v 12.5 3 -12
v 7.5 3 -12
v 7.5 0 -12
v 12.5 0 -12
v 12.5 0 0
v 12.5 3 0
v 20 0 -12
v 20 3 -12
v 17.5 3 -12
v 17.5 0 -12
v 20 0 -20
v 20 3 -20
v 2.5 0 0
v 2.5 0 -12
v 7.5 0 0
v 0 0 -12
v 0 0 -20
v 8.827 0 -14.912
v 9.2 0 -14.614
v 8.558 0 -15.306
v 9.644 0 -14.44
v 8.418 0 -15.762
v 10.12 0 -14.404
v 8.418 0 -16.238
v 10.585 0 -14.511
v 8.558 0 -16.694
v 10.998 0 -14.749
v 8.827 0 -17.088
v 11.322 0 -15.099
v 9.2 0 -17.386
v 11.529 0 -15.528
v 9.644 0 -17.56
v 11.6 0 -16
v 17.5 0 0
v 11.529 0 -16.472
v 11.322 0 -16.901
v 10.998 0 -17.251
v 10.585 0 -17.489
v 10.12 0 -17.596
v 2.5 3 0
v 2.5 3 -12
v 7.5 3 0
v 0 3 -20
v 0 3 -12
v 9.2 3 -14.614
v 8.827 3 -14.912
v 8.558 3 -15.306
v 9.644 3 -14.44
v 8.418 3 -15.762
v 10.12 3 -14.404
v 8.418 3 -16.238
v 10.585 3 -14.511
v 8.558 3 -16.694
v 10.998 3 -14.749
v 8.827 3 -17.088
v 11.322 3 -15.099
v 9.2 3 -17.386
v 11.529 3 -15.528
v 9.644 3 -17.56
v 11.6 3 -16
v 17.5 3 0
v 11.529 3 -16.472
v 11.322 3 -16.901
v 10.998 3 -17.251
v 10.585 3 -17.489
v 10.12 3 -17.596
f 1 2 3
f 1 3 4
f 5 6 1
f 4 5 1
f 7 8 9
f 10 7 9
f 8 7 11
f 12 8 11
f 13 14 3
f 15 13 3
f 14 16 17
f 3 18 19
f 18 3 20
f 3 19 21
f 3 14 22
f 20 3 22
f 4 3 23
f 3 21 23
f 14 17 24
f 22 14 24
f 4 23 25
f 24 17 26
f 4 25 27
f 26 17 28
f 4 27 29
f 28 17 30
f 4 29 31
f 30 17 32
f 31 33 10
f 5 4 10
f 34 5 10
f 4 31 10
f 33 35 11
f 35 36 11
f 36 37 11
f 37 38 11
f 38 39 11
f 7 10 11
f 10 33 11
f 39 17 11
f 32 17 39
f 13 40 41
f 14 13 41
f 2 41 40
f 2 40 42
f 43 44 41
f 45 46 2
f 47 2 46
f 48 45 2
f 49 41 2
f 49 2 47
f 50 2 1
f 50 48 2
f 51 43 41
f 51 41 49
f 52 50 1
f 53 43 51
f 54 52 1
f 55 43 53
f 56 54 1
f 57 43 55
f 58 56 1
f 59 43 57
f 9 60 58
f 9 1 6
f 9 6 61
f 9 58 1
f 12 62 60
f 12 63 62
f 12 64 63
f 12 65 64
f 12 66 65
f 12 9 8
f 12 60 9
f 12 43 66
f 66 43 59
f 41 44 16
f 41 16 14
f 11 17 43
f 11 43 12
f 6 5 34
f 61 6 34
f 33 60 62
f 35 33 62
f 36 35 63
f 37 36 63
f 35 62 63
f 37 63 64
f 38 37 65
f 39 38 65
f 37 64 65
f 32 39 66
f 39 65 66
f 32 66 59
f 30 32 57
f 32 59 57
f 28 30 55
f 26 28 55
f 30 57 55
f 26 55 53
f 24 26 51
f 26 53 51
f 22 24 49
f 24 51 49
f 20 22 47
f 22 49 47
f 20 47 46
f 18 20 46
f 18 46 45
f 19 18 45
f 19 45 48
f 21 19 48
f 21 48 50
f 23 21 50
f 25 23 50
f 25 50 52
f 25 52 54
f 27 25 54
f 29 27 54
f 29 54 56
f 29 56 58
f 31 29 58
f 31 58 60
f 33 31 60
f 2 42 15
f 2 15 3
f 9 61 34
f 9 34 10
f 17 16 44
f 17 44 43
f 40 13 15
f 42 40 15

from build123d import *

# Parameters (mm, degrees)
SKETCH1_W               = 20
SKETCH1_H               = 20
BOSS_EXTRUDE1_DEPTH     = 3
SKETCH2_W               = 2.5
SKETCH2_H               = 12
CUT_EXTRUDE1_DEPTH      = 3
SKETCH3_R               = 1.6
CUT_EXTRUDE2_DEPTH      = 1
CUT_EXTRUDE2_DEPTH_BACK = 4
SKETCH4_W               = 5
SKETCH4_H               = 12
CUT_EXTRUDE3_DEPTH      = 1
CUT_EXTRUDE3_DEPTH_BACK = 4


with BuildPart() as part:
    # Sketch1 → Boss-Extrude1 (new body)
    with BuildSketch(Plane(origin=(0, 0, 0), x_dir=(1, 0, 0), z_dir=(0, 1, 0))):
        with Locations((10, 10)):
            Rectangle(SKETCH1_W, SKETCH1_H)
    extrude(amount=BOSS_EXTRUDE1_DEPTH)

    # Sketch2 → Cut-Extrude1 (cut)
    with BuildSketch(Plane(origin=(0, 3, 0), x_dir=(1, 0, 0), z_dir=(0, 1, 0))):
        with Locations((1.25, 6)):
            Rectangle(SKETCH2_W, SKETCH2_H)
    cut_extrude1 = extrude(amount=-CUT_EXTRUDE1_DEPTH, mode=Mode.SUBTRACT)

    # Mirror1: Cut-Extrude1 across plane
    add(cut_extrude1.mirror(Plane.ZY.offset(-10)), mode=Mode.SUBTRACT)

    # Sketch3 → Cut-Extrude2 (cut, two sides)
    with BuildSketch(Plane(origin=(0, 3, 0), x_dir=(1, 0, 0), z_dir=(0, 1, 0))) as cut_extrude2_sk:
        with Locations((10, 16)):
            Circle(SKETCH3_R)
    extrude(amount=CUT_EXTRUDE2_DEPTH, mode=Mode.SUBTRACT)
    extrude(cut_extrude2_sk.sketch, amount=-CUT_EXTRUDE2_DEPTH_BACK, mode=Mode.SUBTRACT)

    # Sketch4 → Cut-Extrude3 (cut, two sides)
    with BuildSketch(Plane(origin=(0, 3, 0), x_dir=(1, 0, 0), z_dir=(0, 1, 0))) as cut_extrude3_sk:
        with Locations((10, 6)):
            Rectangle(SKETCH4_W, SKETCH4_H)
    extrude(amount=CUT_EXTRUDE3_DEPTH, mode=Mode.SUBTRACT)
    extrude(cut_extrude3_sk.sketch, amount=-CUT_EXTRUDE3_DEPTH_BACK, mode=Mode.SUBTRACT)


solid = part.part
